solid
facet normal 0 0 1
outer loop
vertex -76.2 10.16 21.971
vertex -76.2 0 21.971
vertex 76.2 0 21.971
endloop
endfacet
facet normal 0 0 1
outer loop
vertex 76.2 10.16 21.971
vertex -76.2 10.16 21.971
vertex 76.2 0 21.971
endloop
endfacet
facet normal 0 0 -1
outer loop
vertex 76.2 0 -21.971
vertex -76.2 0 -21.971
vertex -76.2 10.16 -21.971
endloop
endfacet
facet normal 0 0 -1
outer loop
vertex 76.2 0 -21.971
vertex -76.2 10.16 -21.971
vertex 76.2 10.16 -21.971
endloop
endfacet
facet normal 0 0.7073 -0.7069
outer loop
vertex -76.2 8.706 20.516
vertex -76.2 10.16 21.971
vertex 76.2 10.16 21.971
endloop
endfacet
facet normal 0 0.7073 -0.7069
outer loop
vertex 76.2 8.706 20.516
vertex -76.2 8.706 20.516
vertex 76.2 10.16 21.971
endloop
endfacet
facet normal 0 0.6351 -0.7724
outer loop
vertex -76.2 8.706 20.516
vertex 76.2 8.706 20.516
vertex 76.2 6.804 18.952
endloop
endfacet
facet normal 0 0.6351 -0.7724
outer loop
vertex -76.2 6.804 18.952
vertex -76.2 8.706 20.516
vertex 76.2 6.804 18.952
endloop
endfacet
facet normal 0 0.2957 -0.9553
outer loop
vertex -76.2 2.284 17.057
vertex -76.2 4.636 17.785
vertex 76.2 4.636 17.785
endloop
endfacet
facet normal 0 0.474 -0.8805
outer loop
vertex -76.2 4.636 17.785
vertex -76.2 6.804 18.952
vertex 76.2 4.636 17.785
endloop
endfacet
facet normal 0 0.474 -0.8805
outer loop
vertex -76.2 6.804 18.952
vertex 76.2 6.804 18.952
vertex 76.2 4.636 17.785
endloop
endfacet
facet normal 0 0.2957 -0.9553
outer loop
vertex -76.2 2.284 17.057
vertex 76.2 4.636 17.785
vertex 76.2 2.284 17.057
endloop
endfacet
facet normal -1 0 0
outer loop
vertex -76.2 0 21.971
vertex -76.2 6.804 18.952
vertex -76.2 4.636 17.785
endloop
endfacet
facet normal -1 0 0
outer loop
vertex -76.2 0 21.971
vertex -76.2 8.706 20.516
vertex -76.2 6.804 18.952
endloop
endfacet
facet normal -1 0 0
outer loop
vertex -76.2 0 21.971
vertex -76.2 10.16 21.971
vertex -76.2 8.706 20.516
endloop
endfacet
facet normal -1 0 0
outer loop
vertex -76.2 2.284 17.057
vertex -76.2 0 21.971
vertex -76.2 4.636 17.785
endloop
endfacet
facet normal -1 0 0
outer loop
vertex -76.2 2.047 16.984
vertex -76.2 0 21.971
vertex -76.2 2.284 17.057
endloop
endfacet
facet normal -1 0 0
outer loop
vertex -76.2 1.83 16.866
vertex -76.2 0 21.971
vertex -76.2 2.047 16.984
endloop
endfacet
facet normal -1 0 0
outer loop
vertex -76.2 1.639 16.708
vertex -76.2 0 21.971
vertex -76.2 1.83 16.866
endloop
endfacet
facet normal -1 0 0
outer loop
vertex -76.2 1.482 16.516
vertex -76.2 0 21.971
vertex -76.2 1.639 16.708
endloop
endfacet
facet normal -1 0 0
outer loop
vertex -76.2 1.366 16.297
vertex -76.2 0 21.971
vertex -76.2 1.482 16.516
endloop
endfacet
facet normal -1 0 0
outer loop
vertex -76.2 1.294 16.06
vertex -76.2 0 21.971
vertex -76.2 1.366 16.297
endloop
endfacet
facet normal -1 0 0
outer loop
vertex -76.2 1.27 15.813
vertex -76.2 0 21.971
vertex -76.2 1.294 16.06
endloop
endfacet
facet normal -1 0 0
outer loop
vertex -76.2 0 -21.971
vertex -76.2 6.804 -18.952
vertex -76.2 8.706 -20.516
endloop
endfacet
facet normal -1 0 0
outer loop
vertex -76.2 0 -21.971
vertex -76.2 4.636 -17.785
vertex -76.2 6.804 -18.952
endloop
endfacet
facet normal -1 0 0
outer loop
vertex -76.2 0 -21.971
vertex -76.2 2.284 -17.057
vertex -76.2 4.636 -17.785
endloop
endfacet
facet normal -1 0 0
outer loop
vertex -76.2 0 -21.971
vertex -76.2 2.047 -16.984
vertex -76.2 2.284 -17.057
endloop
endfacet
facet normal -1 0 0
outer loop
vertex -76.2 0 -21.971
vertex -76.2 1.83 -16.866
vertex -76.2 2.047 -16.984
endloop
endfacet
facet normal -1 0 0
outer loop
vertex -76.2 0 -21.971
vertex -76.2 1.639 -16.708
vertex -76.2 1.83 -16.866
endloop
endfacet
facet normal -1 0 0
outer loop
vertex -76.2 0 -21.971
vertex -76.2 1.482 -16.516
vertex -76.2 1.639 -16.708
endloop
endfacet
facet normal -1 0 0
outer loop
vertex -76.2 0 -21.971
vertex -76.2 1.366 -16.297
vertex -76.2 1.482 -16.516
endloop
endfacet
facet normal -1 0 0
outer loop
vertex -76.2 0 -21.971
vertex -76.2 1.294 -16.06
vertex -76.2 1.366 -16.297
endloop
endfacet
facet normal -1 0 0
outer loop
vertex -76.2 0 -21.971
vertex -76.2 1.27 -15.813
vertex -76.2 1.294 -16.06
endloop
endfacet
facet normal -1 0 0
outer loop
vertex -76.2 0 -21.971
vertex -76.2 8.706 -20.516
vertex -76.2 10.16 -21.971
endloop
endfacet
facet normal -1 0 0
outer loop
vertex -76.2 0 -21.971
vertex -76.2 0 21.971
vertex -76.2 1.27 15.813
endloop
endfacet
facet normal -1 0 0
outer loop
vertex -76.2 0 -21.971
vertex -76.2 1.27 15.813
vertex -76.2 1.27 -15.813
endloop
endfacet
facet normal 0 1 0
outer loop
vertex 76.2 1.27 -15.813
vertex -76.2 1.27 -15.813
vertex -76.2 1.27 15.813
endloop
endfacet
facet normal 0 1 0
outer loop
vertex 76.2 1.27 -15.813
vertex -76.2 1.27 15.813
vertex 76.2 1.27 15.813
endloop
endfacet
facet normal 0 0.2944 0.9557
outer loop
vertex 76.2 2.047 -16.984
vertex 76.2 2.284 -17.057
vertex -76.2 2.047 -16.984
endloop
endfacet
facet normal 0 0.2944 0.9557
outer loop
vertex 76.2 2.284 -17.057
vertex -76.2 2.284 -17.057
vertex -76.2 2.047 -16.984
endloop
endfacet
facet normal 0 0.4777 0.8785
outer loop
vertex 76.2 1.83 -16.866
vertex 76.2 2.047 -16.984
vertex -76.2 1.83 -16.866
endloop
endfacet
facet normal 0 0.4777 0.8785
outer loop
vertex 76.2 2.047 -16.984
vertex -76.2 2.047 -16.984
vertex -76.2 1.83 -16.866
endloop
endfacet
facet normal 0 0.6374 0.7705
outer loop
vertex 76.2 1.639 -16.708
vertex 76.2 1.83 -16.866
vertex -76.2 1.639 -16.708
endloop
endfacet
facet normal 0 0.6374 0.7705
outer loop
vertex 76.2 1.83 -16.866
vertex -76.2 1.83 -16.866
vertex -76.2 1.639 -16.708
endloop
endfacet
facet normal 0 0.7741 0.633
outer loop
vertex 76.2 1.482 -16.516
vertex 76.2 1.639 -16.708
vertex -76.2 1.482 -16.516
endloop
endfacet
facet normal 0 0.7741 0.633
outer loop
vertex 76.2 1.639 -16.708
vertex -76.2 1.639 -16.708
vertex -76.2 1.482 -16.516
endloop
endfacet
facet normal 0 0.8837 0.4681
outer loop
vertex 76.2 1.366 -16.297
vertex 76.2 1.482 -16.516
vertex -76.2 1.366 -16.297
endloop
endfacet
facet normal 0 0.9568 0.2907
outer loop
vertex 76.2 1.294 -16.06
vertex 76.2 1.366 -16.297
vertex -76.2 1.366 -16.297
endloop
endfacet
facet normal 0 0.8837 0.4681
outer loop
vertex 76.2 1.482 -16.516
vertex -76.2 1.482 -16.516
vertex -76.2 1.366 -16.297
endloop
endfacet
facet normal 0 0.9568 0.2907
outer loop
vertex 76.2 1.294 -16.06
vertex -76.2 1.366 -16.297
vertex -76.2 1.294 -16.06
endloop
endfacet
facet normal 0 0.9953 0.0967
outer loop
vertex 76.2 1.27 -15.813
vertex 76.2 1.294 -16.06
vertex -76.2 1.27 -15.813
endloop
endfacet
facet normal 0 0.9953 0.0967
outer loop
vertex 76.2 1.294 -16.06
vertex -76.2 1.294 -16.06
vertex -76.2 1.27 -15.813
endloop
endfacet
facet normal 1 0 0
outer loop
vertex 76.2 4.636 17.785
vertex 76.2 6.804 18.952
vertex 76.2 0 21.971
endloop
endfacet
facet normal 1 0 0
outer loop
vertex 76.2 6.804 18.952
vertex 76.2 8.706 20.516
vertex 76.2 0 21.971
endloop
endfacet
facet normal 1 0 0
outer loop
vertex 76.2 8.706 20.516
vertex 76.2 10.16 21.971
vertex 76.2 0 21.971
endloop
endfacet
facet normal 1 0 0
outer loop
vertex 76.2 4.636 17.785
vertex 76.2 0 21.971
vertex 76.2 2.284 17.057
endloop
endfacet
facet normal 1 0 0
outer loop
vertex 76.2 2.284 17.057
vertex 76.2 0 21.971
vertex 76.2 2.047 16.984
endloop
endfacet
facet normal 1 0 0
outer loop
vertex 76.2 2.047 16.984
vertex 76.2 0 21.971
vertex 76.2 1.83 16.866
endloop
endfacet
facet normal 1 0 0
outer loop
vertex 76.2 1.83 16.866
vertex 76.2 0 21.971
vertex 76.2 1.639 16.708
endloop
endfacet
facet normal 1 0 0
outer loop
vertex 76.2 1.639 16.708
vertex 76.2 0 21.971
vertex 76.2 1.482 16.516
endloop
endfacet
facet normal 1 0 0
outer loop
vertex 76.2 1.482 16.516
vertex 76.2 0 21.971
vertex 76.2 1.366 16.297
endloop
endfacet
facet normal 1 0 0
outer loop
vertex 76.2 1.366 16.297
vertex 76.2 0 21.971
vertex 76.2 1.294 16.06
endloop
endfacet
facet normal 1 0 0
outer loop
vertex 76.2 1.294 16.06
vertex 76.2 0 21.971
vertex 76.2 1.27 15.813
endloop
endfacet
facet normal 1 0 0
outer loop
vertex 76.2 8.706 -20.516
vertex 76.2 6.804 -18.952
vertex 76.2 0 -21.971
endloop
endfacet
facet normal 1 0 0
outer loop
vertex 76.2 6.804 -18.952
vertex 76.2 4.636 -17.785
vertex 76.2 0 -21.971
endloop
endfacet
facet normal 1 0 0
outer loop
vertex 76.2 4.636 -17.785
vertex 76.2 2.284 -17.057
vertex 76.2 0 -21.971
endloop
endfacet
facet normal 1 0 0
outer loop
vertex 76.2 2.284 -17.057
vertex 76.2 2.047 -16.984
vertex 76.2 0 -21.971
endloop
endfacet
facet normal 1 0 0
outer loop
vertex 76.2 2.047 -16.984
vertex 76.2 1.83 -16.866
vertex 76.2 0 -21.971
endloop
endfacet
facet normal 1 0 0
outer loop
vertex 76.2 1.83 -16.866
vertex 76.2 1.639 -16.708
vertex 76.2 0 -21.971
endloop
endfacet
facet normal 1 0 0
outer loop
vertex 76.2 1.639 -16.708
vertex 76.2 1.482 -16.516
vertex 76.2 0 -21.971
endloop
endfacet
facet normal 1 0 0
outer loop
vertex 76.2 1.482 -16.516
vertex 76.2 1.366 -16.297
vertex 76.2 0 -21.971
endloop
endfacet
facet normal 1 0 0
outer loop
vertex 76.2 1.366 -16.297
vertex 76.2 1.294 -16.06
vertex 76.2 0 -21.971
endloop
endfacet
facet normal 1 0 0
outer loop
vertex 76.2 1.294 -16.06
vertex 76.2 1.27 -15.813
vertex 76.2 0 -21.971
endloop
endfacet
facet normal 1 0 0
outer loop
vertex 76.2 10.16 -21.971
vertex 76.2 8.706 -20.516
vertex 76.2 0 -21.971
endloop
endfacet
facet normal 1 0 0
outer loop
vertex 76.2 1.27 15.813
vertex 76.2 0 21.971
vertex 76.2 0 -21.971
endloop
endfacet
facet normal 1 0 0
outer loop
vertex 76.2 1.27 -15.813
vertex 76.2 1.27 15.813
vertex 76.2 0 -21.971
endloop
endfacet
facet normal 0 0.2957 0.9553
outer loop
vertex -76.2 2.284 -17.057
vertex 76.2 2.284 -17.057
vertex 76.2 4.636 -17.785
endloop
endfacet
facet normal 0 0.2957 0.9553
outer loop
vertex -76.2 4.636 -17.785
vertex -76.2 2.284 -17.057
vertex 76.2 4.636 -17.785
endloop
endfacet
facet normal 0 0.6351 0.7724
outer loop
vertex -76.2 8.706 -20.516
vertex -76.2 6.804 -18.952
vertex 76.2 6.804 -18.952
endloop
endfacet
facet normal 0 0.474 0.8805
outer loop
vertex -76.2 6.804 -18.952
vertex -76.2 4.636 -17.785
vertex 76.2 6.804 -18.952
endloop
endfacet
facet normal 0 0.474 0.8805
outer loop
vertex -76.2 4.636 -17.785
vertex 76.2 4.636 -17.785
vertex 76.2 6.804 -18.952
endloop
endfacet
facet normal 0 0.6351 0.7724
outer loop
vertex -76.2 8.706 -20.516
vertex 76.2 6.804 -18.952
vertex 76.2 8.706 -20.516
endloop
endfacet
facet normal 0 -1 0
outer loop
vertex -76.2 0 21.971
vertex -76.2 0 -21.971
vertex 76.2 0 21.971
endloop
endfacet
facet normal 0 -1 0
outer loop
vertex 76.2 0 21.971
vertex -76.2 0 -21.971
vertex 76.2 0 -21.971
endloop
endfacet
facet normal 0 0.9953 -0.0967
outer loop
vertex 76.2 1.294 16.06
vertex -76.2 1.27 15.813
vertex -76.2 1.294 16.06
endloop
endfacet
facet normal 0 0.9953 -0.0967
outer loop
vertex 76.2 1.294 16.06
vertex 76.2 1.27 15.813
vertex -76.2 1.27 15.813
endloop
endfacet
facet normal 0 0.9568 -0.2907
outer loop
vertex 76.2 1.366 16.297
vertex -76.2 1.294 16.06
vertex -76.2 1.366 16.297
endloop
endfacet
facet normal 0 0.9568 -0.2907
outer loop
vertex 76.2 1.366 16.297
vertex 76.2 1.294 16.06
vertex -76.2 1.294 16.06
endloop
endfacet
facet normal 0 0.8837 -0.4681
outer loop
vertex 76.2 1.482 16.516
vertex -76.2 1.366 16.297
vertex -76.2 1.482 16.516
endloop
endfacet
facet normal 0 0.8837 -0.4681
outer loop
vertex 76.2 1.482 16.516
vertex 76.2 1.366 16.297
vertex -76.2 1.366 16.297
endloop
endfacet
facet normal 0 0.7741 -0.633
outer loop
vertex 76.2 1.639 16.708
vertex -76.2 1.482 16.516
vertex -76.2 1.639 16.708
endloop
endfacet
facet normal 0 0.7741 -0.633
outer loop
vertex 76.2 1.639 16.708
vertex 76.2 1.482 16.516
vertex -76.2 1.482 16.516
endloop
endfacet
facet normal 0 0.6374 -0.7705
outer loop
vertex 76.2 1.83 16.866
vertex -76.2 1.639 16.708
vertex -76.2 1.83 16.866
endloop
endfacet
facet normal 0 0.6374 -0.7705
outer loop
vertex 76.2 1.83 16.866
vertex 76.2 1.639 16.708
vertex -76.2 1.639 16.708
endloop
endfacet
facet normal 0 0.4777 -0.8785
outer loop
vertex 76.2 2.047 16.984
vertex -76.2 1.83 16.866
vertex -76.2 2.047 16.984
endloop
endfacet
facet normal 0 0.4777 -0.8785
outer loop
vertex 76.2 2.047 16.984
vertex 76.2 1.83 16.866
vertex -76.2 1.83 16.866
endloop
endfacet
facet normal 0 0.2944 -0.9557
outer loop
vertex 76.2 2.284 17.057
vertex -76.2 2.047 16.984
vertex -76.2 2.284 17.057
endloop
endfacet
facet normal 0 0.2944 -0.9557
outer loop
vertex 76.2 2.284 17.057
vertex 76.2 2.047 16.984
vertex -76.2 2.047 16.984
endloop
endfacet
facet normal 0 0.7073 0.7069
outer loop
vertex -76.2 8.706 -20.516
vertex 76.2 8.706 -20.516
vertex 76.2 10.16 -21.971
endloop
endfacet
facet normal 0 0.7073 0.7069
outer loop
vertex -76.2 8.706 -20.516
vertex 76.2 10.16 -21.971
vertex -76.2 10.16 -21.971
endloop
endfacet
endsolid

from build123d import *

# Parameters (mm, degrees)
SKETCH1_W           = 152.4
SKETCH1_H           = 43.942
BOSS_EXTRUDE1_DEPTH = 10.16
SKETCH2_W           = 139.7
SKETCH2_H           = 33.782
SKETCH2_W_2         = 6.35
CUT_EXTRUDE1_DEPTH  = 8.89
CHAMFER1_SIZE       = 5.08
FILLET1_R           = 12.7
FILLET2_R           = 1.27


# Some blends are built 0.0001 mm under size
with BuildPart() as part:
    # Sketch1 → Boss-Extrude1 (new body)
    with BuildSketch(Plane(origin=(0, 0, 0), x_dir=(1, 0, 0), z_dir=(0, 1, 0))):
        Rectangle(SKETCH1_W, SKETCH1_H)
    extrude(amount=BOSS_EXTRUDE1_DEPTH)

    # Sketch2 → Cut-Extrude1 (cut)
    with BuildSketch(Plane(origin=(0, 10.16, 0), x_dir=(1, 0, 0), z_dir=(0, 1, 0))):
        Rectangle(SKETCH2_W, SKETCH2_H)
        with Locations((73.025, 0)):
            Rectangle(SKETCH2_W_2, SKETCH2_H)
        with Locations((-73.025, 0)):
            Rectangle(SKETCH2_W_2, SKETCH2_H)
    extrude(amount=-CUT_EXTRUDE1_DEPTH, mode=Mode.SUBTRACT)

    # Chamfer1
    chamfer1_edges = [part.edges().sort_by_distance(p)[0] for p in [
        (0, 10.16, 16.891),
        (0, 10.16, -16.891),
    ]]
    chamfer(chamfer1_edges, length=CHAMFER1_SIZE - 0.0001)  # a hair under: the kernel refuses the full size

    # Fillet1
    # the kernel refuses this fillet: 12.7 mm, written as the material it takes off along each edge
    with BuildSketch(Plane(origin=(89.017910379, 5.0801, 16.891), x_dir=(0, -1, 0), z_dir=(-1, 0, 0))) as fillet1_piece_1:
        with BuildLine():
            CenterArc((5.354803581, 12.605708661), FILLET1_R, 225, 38.013804416)
            Line((-3.62545254, 3.62545254), (-3.805057662, 3.445847418))
            Line((-3.805057662, 3.445847418), (-0.179605122, -0.179605122))
            Line((-0.179605122, -0.179605122), (0, -0.254))
            ThreePointArc((0, -0.254), (1.90505, -0.254), (3.779205928, -0.252114173))
            Line((3.779205928, -0.252114173), (3.8101, 0))
        make_face()
    extrude(amount=178.035820759, mode=Mode.SUBTRACT)
    with BuildSketch(Plane(origin=(89.017910379, 5.0801, -16.891), x_dir=(0, 0.7071067811865476, -0.7071067811865476), z_dir=(-1, 0, 0))) as fillet1_piece_2:
        with BuildLine():
            CenterArc((5.127164152, 12.7), FILLET1_R, 231.986195584, 38.013804416)
            Line((-2.694147547, 2.694147547), (-2.850573781, 2.494030498))
            ThreePointArc((-2.850573781, 2.494030498), (-1.526678896, 1.167468651), (-0.179605122, -0.179605122))
            Line((-0.179605122, -0.179605122), (0, -0.254))
            Line((0, -0.254), (5.127164152, -0.254))
            Line((5.127164152, -0.254), (5.127164152, 0))
        make_face()
    extrude(amount=178.035820759, mode=Mode.SUBTRACT)

    # Fillet2
    fillet2_edges = [part.edges().sort_by_distance(p)[0] for p in [
        (0, 1.27, 16.891),
        (0, 1.27, -16.891),
    ]]
    fillet(fillet2_edges, radius=FILLET2_R)


solid = part.part
